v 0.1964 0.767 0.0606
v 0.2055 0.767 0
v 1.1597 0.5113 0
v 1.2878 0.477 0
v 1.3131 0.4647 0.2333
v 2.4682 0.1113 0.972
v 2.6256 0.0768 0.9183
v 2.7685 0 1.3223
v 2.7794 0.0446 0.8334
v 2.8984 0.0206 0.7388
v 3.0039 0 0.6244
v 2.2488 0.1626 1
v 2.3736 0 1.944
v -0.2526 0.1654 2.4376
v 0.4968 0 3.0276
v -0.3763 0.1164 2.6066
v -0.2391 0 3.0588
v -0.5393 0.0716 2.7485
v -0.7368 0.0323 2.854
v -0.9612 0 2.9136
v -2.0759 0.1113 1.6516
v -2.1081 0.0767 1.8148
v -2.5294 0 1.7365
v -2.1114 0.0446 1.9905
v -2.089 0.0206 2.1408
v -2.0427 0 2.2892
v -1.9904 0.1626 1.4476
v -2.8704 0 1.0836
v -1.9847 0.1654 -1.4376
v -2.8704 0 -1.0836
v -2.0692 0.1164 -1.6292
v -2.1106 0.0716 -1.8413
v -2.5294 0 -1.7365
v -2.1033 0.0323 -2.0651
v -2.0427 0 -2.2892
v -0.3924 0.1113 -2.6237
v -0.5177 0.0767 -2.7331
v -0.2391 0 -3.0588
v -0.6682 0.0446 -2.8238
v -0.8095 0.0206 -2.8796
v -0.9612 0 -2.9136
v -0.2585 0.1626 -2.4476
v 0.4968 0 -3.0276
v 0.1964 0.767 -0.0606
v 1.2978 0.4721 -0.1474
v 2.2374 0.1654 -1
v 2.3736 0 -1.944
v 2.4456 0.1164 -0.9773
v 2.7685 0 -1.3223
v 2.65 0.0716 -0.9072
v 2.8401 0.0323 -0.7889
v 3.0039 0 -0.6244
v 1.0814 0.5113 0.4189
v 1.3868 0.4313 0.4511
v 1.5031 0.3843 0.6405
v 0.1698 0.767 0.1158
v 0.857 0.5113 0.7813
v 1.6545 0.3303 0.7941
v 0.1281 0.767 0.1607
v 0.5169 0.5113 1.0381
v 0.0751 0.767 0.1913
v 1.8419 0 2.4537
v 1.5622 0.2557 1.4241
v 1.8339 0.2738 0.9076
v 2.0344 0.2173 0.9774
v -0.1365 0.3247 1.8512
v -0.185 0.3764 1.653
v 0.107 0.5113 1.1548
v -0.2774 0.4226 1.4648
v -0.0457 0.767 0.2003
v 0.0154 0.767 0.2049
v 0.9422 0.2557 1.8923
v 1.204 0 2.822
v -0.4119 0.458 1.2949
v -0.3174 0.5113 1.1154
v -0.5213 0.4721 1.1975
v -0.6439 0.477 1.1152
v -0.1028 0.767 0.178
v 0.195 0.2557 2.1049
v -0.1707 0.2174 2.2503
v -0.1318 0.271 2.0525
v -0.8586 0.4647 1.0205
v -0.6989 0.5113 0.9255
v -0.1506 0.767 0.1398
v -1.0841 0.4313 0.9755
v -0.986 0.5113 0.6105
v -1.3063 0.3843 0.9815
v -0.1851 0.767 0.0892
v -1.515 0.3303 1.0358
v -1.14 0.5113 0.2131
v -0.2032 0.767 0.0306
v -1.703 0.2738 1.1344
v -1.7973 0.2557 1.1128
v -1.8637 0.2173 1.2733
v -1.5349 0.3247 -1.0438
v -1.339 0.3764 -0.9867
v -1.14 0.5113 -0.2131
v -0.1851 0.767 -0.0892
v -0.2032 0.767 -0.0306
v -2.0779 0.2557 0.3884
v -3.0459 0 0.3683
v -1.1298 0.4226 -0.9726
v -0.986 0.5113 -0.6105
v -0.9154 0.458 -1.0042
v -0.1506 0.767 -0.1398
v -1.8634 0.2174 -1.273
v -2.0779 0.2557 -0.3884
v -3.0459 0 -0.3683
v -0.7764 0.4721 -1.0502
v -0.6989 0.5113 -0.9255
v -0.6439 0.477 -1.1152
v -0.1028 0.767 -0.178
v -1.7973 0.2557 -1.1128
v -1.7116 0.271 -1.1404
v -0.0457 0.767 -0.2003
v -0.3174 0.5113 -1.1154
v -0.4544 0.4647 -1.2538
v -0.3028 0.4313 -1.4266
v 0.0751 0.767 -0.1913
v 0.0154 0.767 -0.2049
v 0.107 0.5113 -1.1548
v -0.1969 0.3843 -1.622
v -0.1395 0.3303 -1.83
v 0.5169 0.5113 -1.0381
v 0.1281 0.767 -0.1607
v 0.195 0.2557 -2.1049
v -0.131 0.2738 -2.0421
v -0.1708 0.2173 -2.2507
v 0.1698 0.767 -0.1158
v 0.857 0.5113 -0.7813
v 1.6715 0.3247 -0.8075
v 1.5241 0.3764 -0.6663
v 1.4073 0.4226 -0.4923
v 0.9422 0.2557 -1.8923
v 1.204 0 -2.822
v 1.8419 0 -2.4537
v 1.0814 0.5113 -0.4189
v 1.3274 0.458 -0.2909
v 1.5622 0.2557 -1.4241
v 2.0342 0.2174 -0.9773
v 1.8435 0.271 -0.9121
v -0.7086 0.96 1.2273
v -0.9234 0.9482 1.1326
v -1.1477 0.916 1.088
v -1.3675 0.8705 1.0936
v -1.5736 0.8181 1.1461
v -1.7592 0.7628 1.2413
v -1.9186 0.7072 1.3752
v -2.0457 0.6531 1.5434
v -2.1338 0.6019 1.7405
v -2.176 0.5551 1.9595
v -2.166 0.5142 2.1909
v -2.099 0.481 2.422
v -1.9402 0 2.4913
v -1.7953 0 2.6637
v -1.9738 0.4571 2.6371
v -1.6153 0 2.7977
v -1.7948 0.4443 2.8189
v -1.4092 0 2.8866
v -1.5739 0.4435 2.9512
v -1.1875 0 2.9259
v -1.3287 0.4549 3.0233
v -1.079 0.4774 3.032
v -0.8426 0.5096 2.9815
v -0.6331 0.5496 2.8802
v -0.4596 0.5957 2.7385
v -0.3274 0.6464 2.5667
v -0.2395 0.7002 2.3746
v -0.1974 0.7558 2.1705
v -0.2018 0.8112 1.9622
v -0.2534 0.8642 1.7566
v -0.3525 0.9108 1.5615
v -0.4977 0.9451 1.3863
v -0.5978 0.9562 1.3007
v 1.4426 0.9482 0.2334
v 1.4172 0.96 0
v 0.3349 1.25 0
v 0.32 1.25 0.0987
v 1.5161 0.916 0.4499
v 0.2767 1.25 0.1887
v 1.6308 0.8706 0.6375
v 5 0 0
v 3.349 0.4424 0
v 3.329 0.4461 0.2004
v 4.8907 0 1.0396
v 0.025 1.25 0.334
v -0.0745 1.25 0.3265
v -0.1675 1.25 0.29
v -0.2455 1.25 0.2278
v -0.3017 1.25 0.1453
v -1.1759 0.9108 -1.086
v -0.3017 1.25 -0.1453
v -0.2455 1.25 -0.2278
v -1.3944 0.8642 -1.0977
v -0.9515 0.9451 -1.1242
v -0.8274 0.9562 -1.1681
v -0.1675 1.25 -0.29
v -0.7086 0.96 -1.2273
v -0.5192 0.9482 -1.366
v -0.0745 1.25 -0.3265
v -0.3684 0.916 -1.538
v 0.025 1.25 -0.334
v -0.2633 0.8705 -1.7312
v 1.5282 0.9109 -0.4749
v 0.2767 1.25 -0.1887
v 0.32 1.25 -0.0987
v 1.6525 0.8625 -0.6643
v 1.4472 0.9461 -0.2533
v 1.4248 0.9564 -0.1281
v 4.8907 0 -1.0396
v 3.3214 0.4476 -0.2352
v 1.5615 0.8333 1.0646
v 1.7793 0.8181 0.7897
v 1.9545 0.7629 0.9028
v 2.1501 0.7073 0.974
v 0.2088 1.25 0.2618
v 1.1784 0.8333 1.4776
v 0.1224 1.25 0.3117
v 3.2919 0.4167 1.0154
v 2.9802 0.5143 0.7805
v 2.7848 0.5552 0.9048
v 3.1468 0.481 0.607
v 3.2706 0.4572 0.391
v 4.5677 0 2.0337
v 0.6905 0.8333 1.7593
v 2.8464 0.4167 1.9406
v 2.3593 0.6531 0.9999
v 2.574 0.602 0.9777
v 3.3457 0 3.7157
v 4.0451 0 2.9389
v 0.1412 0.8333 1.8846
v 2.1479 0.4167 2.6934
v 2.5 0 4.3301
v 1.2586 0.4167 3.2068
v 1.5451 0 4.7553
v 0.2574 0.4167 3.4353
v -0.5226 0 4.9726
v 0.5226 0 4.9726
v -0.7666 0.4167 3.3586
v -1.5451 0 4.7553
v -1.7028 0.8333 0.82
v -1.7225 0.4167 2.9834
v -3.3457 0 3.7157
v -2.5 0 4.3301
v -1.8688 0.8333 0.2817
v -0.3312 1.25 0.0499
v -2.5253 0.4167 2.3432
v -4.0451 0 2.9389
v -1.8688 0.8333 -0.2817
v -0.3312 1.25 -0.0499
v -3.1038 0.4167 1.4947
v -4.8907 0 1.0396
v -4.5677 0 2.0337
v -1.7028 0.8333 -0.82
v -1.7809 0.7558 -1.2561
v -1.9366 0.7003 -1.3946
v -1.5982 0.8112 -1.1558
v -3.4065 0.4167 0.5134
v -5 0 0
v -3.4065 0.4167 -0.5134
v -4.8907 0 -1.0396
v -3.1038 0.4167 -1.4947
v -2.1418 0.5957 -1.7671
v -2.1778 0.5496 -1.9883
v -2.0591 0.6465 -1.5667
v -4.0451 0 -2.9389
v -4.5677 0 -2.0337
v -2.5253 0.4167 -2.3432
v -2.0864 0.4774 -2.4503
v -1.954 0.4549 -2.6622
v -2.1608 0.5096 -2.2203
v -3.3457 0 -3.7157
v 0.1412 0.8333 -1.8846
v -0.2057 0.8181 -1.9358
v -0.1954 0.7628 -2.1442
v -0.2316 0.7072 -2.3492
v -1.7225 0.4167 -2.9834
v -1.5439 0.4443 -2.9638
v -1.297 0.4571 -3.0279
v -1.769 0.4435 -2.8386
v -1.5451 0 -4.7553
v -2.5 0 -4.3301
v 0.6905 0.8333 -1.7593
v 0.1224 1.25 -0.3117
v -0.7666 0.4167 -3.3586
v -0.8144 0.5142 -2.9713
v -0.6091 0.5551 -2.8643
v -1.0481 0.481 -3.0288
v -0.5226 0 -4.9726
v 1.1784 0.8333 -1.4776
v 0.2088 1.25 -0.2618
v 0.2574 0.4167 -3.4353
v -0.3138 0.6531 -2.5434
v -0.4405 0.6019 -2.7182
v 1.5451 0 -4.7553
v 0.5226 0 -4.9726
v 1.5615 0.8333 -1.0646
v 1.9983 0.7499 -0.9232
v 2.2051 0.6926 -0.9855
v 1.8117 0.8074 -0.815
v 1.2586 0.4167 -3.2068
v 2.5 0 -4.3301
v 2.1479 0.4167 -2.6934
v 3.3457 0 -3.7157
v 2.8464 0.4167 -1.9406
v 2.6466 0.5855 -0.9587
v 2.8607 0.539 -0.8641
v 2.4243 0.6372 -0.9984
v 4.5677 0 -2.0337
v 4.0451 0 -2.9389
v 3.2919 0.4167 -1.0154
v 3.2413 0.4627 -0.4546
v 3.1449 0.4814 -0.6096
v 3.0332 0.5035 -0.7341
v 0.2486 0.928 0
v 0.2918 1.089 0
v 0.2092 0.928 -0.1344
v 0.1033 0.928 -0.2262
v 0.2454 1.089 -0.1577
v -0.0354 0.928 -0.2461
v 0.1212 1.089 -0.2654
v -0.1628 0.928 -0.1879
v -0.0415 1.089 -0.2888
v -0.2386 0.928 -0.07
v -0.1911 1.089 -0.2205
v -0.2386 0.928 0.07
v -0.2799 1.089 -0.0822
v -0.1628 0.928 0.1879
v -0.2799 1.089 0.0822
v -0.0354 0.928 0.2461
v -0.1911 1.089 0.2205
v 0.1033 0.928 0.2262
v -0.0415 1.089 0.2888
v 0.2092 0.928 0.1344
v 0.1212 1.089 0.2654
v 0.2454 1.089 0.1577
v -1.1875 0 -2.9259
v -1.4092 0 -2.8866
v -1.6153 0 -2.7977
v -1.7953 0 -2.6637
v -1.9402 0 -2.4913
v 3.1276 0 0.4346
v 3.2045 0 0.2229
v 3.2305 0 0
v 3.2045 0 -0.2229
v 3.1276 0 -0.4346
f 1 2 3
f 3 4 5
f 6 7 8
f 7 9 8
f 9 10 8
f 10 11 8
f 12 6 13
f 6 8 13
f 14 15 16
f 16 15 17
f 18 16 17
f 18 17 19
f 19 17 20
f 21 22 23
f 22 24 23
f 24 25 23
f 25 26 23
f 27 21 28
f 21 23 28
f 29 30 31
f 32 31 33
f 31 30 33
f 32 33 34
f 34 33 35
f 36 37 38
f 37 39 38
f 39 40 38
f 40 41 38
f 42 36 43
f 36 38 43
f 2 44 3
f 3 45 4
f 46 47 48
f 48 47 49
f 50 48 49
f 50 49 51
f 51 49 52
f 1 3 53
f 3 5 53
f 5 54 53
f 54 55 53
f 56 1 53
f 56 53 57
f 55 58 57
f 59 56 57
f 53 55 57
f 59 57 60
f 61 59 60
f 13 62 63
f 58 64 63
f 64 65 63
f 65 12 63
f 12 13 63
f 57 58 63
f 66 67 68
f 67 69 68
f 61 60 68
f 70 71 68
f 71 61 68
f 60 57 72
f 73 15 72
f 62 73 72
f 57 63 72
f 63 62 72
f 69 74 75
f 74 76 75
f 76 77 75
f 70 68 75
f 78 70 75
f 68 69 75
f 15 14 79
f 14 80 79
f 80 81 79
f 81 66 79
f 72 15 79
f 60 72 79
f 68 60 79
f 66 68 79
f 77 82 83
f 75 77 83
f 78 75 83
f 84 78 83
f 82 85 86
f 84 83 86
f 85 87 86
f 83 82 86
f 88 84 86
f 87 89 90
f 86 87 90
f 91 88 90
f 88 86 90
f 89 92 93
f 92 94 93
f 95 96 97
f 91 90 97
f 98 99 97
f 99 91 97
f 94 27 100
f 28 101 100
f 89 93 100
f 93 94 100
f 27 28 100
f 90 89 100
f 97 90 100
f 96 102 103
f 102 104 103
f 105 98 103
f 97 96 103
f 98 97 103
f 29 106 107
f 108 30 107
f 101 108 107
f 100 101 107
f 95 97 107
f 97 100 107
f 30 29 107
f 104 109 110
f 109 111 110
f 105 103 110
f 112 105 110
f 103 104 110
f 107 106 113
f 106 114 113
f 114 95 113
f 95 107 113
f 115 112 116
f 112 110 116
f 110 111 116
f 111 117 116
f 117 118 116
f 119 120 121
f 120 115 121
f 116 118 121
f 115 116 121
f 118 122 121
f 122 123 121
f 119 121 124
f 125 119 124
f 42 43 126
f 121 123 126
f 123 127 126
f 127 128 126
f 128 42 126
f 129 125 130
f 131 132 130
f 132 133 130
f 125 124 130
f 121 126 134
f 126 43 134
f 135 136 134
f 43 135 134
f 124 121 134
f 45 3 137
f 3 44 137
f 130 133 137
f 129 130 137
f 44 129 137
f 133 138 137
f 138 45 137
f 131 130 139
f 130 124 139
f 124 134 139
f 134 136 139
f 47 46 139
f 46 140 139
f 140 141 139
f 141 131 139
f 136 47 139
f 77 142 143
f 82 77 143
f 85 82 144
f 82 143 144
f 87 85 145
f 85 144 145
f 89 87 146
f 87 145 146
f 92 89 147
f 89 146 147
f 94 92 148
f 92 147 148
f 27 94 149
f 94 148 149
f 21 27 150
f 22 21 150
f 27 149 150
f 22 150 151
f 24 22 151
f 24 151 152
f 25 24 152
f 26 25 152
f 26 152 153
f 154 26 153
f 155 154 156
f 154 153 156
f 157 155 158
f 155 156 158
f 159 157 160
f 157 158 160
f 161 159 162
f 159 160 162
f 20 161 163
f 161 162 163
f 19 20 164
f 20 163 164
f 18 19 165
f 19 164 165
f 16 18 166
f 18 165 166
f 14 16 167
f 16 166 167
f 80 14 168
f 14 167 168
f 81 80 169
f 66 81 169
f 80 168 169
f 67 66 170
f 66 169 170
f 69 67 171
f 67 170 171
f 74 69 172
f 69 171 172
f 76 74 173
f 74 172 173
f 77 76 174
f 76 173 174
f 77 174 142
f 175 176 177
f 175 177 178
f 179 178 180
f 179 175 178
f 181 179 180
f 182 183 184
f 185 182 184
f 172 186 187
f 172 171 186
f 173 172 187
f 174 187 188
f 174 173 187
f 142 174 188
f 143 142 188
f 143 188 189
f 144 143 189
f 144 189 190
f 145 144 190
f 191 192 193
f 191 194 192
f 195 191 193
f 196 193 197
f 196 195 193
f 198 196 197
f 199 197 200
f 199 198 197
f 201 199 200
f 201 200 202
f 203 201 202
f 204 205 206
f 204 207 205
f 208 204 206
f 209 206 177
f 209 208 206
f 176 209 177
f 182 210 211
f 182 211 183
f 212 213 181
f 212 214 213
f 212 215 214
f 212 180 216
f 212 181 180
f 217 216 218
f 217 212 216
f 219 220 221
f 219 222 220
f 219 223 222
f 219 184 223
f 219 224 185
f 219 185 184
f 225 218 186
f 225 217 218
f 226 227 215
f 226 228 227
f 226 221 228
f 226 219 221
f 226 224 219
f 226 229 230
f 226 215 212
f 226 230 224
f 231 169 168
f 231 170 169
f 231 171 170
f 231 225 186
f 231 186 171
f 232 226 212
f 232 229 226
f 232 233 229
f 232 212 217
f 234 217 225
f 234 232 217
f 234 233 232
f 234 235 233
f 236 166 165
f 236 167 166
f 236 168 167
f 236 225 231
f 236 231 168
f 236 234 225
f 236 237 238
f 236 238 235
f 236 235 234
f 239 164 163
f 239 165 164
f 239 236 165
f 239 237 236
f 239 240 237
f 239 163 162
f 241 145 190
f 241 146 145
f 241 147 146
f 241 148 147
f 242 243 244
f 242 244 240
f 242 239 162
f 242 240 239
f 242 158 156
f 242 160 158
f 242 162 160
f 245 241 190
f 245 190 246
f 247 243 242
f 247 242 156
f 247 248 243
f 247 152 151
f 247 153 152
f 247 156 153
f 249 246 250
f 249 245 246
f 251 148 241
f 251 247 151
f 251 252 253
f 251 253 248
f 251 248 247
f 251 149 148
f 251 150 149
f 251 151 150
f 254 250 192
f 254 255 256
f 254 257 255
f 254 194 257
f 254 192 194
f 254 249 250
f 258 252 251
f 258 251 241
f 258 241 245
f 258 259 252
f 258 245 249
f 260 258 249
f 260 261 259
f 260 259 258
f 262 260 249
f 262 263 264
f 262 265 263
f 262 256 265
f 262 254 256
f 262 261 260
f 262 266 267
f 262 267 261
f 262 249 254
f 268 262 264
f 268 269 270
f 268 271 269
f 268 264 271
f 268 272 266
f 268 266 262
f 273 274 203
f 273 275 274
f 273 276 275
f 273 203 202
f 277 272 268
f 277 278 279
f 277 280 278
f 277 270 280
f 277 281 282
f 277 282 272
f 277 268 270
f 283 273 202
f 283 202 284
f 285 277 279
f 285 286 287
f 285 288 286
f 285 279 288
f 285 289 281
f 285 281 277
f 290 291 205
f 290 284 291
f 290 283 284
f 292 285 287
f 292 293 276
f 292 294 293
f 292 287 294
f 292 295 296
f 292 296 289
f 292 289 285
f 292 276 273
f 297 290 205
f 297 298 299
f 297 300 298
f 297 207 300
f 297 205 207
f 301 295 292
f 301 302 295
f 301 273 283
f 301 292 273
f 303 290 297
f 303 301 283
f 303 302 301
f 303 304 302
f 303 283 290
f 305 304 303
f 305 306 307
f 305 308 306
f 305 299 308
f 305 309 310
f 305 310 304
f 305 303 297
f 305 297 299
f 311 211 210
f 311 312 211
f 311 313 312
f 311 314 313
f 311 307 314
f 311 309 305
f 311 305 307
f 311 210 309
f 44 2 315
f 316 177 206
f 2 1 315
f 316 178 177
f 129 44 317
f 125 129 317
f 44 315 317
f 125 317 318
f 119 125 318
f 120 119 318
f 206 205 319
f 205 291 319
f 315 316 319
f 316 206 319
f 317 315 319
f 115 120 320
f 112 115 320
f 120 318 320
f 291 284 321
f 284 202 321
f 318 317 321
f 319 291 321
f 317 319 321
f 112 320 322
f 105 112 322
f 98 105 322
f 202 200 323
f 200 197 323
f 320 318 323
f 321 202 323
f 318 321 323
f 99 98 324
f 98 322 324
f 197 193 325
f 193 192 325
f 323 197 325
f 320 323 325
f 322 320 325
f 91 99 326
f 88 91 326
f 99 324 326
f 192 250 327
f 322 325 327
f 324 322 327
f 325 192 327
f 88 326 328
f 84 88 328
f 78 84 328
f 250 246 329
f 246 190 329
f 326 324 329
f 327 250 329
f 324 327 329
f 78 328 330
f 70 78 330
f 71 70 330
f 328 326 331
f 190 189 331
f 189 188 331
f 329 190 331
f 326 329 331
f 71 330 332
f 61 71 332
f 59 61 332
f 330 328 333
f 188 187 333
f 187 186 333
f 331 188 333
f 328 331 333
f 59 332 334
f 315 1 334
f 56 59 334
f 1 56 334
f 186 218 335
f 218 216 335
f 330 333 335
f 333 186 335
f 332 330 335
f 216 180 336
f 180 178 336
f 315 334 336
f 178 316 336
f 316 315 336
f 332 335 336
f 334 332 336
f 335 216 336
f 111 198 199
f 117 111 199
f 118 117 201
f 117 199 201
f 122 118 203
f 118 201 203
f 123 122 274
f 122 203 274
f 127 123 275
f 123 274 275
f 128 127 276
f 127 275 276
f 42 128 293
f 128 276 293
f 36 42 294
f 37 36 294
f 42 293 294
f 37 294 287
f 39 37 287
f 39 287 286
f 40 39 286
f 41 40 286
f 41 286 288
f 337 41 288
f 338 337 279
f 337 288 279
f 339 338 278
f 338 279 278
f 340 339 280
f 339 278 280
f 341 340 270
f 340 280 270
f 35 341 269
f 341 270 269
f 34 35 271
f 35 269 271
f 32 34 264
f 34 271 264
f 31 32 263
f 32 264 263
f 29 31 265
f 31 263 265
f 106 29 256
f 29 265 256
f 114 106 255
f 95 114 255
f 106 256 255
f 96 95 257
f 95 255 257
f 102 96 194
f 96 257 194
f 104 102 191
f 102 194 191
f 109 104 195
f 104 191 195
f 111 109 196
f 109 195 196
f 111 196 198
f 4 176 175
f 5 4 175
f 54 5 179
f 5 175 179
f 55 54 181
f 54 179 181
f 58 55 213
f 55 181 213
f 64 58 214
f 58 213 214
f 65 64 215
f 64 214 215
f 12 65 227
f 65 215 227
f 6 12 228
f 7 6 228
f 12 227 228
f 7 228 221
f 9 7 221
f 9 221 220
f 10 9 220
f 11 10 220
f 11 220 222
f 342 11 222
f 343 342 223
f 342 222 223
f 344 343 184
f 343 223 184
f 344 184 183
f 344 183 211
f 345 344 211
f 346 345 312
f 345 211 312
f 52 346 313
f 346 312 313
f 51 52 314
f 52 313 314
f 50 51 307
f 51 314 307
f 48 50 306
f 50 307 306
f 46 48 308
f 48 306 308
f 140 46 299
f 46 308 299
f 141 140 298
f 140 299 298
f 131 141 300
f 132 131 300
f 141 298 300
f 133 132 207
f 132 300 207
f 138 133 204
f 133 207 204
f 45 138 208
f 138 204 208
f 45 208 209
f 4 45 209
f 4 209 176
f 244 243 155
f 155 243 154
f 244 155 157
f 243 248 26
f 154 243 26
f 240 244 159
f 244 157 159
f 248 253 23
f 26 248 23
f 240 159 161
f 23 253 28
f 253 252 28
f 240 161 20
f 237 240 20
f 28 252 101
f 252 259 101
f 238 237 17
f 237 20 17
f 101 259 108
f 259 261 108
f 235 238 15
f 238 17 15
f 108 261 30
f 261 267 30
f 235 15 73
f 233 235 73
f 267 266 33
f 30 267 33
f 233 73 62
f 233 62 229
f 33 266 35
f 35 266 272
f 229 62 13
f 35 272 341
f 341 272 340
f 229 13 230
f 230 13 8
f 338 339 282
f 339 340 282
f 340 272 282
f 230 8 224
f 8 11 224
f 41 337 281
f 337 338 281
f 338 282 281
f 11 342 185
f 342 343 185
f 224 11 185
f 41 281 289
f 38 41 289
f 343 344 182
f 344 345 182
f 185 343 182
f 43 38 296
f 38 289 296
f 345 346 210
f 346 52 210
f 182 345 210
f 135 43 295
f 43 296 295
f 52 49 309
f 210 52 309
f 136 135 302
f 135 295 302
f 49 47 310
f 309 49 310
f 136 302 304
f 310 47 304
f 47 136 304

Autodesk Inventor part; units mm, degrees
ref_plane "YZ Plane" through (0, 0, 0) normal (1, 0, 0) x (0, 1, 0)
ref_plane "XZ Plane" through (0, 0, 0) normal (0, 1, 0) x (-1, 0, 0)
sketch "Sketch1" plane through (0, 0, 0) normal (0, 0, 1) x (1, 0, 0)
  line L0 (0, -0.2679) -> (0, 1.6077) projected
  line L1 (3.0681, 0) -> (5, 0)
  line L2 (5, 0) -> (0.3349, 1.25)
  line L3 (0, 1.3397) -> (0, 0)
  line L4 (0, 0) -> (0.3349, 1.25) construction
  line L5 (0, 0) -> (1.2941, 0) construction
  line L6 (0.3349, 1.25) -> (0.2055, 0.767)
  line L7 (0.2055, 0.767) -> (3.0681, 0)
  dimension "d2" = 5
  dimension "d3" = 15
  dimension "d4" = 75
  dimension "d16" = 0.5
revolve "Revolution1" add sketch "Sketch1" angle 360 about axis through (0, -10, 0) along (0, 1, 0)
ref_plane "Work Plane2" through (5, 0, 0) normal (0.2588, 0.9659, 0) x (-0.9659, 0.2588, 0)
sketch "Sketch5" plane through (5, 0, 0) normal (0.2588, 0.9659, 0) x (-0.9659, 0.2588, 0)
  circle A0 centre (2.7092, 0) radius 1
  point P0 (4.8296, 0)
  dimension "d18" = 2
extrude "Extrusion2" cut sketch "Sketch5" against normal through all
pattern_circular "Circular Pattern3" count 3 over 360 about axis through (0, -10, 0) along (0, 1, 0) of "Extrusion2"
properties part number "Splitter"
